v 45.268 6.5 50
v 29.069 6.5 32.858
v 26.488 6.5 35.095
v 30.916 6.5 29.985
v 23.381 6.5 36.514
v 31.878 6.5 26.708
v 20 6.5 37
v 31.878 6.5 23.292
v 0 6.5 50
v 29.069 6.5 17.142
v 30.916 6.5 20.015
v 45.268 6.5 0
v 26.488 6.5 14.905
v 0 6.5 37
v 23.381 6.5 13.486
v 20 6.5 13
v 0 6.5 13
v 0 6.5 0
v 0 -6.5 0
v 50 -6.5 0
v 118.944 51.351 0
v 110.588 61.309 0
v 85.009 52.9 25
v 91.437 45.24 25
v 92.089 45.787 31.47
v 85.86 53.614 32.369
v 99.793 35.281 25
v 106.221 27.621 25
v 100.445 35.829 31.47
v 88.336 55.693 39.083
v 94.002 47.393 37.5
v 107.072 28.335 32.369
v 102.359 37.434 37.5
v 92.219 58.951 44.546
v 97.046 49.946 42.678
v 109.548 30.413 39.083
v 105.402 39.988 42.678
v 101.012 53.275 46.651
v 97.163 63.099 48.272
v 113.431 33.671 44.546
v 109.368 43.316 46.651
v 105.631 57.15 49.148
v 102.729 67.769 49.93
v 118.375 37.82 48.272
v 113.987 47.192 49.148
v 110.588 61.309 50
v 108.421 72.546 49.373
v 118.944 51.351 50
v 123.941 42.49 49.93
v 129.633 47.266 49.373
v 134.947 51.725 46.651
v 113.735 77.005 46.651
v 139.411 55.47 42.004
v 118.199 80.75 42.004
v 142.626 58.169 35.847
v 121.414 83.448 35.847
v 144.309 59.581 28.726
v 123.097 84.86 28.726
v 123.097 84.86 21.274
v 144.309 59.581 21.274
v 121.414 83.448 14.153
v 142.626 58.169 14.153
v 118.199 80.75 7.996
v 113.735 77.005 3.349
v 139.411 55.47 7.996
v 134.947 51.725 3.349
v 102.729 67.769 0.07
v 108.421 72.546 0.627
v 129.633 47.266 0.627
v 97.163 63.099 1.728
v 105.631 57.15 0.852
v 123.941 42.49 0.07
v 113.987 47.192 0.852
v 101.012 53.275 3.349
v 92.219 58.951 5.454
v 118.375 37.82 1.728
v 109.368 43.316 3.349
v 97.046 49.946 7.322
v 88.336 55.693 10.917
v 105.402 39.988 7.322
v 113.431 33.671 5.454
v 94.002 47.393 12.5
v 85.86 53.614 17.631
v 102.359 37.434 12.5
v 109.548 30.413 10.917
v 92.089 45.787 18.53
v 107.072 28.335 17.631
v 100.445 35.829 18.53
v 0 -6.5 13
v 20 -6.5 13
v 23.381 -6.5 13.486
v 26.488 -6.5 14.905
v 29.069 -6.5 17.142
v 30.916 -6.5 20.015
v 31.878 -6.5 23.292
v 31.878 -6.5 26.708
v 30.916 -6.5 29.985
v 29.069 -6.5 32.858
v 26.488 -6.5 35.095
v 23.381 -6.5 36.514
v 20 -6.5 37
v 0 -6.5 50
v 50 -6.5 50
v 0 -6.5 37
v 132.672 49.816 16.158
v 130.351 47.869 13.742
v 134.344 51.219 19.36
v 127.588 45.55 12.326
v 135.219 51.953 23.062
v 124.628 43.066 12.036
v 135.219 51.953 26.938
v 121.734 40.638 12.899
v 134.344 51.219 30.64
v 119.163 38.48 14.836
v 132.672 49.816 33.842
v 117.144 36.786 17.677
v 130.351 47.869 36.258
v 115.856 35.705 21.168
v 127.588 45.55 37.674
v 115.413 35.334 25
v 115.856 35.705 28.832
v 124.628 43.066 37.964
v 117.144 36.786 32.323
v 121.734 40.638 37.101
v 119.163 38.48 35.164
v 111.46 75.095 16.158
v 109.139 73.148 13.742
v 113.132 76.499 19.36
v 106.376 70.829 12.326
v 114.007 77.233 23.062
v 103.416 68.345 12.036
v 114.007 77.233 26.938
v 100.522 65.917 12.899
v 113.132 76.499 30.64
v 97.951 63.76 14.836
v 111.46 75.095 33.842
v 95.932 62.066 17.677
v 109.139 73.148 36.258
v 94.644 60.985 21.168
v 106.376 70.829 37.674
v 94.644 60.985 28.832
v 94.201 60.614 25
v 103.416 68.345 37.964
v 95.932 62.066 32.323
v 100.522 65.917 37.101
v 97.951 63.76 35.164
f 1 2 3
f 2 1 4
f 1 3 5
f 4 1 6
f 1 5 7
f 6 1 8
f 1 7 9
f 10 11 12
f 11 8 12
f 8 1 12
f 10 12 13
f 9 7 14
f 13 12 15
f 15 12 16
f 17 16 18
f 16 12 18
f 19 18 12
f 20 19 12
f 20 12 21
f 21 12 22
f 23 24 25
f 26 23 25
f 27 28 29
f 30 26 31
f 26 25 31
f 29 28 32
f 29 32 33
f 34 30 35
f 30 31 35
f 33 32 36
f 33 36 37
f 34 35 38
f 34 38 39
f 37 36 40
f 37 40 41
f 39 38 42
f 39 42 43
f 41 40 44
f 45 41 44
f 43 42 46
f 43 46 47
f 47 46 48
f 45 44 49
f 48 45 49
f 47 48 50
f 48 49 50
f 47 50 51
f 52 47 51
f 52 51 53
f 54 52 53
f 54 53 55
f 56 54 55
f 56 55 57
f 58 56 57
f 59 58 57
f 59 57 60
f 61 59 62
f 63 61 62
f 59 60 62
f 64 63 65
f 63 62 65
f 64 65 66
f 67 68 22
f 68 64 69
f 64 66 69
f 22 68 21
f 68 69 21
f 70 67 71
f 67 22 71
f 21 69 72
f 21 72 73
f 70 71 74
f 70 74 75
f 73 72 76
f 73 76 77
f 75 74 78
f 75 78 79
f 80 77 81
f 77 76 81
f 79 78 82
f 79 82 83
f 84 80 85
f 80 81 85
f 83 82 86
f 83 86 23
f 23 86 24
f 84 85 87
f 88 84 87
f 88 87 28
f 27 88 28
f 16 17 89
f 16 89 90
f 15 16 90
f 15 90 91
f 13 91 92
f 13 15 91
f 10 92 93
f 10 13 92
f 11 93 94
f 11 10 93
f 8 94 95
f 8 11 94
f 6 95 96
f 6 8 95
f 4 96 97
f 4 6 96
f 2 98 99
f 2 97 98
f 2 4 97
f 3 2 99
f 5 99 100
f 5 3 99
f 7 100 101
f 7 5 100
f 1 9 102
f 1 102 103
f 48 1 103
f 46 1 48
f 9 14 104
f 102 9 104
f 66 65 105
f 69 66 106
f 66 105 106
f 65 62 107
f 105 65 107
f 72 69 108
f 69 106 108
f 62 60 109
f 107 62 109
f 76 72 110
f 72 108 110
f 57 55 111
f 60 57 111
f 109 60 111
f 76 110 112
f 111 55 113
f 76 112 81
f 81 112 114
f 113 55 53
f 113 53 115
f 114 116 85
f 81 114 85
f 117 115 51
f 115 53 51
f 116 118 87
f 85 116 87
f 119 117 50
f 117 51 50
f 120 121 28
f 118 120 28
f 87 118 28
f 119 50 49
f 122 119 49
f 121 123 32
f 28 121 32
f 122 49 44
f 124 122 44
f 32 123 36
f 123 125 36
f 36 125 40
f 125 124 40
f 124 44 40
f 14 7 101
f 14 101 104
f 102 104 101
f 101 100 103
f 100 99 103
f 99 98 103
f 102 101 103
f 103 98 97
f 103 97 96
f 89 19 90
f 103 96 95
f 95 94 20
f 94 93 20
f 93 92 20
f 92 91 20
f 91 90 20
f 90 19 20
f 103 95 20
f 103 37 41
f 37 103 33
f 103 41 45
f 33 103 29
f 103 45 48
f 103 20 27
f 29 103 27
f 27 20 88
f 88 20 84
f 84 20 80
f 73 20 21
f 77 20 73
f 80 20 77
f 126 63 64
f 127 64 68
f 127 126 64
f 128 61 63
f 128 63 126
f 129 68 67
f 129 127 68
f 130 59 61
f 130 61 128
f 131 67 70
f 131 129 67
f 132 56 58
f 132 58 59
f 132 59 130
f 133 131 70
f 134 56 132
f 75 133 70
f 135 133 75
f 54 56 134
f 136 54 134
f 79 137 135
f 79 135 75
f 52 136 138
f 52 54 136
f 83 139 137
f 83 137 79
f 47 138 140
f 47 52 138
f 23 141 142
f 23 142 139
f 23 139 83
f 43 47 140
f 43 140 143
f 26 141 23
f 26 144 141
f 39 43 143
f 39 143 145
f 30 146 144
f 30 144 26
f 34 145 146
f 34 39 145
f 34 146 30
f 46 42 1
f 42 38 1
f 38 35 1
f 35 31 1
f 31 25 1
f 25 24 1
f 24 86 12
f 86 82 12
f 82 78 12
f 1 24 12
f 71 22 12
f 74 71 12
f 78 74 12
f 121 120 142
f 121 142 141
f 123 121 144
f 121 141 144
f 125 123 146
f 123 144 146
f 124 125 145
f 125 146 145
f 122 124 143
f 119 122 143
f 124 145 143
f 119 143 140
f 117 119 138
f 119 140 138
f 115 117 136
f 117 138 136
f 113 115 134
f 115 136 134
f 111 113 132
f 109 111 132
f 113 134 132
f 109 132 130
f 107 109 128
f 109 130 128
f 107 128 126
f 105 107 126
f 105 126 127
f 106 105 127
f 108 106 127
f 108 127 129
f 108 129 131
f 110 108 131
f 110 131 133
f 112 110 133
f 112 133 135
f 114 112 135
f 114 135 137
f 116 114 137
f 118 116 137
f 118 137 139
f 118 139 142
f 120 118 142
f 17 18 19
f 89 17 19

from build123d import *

# Parameters (mm, degrees)
BOSS_EXTRUDE1_DEPTH      = 50
BOSS_EXTRUDE2_DEPTH      = 10
BOSS_EXTRUDE2_DEPTH_BACK = 23
SKETCH3_R                = 25
CUT_EXTRUDE1_REACH       = 173.917
SKETCH6_R                = 13
CUT_EXTRUDE2_DEPTH       = 174.304008792


with BuildPart() as part:
    # Sketch1 → Boss-Extrude1 (new body)
    with BuildSketch(Plane.XY):
        Polygon((0, 6.5), (0, 0), (47.634193477, 0), (114.765880418, 56.330173752), (110.587760955, 61.309462632), (45.268386955, 6.5), align=None)
        Polygon((47.634193477, 0), (0, 0), (0, -6.5), (50, -6.5), (118.943999881, 51.350884872), (114.765880418, 56.330173752), align=None)
    extrude(amount=BOSS_EXTRUDE1_DEPTH)

    # Sketch3 → Boss-Extrude2 (add, two sides: drawn at the far end of the back side and taken through both)
    with BuildSketch(Plane(origin=(15.50318183, -18.475972642, 0), x_dir=(0.7660444431189771, 0.6427876096865404, 0), z_dir=(-0.6427876096865404, 0.7660444431189771, 0)).offset(-BOSS_EXTRUDE2_DEPTH_BACK)):
        with Locations(Location((124.124102693, -25, 0), (0, 0, 180))):
            Circle(SKETCH3_R)
    extrude(amount=BOSS_EXTRUDE2_DEPTH + BOSS_EXTRUDE2_DEPTH_BACK)

    # Sketch5 → Cut-Extrude1 (cut, up to next)
    with BuildSketch(Plane(origin=(0, 6.5, 0), x_dir=(1, 0, 0), z_dir=(0, 1, 0)), mode=Mode.PRIVATE) as cut_extrude1_sk1:
        with BuildLine():
            Line((0, -13), (20, -13))
            ThreePointArc((20, -13), (32, -25), (20, -37))
            Line((20, -37), (0, -37))
            ThreePointArc((0, -37), (-12, -25), (0, -13))
        make_face()
    cut_extrude1_tool1 = extrude(cut_extrude1_sk1.sketch, amount=-CUT_EXTRUDE1_REACH, mode=Mode.PRIVATE) & part.part
    add(cut_extrude1_tool1.solids().sort_by_distance((10, 6.5, 25))[0], mode=Mode.SUBTRACT)

    # Sketch6 → Cut-Extrude2 (cut, through all)
    with BuildSketch(Plane(origin=(9.075305733, -10.815528211, 0), x_dir=(0.7660444431189771, 0.6427876096865404, 0), z_dir=(-0.6427876096865404, 0.7660444431189771, 0))):
        with Locations(Location((124.124102693, -25, 0), (0, 0, 180))):
            Circle(SKETCH6_R)
    extrude(amount=-CUT_EXTRUDE2_DEPTH, mode=Mode.SUBTRACT)


solid = part.part
